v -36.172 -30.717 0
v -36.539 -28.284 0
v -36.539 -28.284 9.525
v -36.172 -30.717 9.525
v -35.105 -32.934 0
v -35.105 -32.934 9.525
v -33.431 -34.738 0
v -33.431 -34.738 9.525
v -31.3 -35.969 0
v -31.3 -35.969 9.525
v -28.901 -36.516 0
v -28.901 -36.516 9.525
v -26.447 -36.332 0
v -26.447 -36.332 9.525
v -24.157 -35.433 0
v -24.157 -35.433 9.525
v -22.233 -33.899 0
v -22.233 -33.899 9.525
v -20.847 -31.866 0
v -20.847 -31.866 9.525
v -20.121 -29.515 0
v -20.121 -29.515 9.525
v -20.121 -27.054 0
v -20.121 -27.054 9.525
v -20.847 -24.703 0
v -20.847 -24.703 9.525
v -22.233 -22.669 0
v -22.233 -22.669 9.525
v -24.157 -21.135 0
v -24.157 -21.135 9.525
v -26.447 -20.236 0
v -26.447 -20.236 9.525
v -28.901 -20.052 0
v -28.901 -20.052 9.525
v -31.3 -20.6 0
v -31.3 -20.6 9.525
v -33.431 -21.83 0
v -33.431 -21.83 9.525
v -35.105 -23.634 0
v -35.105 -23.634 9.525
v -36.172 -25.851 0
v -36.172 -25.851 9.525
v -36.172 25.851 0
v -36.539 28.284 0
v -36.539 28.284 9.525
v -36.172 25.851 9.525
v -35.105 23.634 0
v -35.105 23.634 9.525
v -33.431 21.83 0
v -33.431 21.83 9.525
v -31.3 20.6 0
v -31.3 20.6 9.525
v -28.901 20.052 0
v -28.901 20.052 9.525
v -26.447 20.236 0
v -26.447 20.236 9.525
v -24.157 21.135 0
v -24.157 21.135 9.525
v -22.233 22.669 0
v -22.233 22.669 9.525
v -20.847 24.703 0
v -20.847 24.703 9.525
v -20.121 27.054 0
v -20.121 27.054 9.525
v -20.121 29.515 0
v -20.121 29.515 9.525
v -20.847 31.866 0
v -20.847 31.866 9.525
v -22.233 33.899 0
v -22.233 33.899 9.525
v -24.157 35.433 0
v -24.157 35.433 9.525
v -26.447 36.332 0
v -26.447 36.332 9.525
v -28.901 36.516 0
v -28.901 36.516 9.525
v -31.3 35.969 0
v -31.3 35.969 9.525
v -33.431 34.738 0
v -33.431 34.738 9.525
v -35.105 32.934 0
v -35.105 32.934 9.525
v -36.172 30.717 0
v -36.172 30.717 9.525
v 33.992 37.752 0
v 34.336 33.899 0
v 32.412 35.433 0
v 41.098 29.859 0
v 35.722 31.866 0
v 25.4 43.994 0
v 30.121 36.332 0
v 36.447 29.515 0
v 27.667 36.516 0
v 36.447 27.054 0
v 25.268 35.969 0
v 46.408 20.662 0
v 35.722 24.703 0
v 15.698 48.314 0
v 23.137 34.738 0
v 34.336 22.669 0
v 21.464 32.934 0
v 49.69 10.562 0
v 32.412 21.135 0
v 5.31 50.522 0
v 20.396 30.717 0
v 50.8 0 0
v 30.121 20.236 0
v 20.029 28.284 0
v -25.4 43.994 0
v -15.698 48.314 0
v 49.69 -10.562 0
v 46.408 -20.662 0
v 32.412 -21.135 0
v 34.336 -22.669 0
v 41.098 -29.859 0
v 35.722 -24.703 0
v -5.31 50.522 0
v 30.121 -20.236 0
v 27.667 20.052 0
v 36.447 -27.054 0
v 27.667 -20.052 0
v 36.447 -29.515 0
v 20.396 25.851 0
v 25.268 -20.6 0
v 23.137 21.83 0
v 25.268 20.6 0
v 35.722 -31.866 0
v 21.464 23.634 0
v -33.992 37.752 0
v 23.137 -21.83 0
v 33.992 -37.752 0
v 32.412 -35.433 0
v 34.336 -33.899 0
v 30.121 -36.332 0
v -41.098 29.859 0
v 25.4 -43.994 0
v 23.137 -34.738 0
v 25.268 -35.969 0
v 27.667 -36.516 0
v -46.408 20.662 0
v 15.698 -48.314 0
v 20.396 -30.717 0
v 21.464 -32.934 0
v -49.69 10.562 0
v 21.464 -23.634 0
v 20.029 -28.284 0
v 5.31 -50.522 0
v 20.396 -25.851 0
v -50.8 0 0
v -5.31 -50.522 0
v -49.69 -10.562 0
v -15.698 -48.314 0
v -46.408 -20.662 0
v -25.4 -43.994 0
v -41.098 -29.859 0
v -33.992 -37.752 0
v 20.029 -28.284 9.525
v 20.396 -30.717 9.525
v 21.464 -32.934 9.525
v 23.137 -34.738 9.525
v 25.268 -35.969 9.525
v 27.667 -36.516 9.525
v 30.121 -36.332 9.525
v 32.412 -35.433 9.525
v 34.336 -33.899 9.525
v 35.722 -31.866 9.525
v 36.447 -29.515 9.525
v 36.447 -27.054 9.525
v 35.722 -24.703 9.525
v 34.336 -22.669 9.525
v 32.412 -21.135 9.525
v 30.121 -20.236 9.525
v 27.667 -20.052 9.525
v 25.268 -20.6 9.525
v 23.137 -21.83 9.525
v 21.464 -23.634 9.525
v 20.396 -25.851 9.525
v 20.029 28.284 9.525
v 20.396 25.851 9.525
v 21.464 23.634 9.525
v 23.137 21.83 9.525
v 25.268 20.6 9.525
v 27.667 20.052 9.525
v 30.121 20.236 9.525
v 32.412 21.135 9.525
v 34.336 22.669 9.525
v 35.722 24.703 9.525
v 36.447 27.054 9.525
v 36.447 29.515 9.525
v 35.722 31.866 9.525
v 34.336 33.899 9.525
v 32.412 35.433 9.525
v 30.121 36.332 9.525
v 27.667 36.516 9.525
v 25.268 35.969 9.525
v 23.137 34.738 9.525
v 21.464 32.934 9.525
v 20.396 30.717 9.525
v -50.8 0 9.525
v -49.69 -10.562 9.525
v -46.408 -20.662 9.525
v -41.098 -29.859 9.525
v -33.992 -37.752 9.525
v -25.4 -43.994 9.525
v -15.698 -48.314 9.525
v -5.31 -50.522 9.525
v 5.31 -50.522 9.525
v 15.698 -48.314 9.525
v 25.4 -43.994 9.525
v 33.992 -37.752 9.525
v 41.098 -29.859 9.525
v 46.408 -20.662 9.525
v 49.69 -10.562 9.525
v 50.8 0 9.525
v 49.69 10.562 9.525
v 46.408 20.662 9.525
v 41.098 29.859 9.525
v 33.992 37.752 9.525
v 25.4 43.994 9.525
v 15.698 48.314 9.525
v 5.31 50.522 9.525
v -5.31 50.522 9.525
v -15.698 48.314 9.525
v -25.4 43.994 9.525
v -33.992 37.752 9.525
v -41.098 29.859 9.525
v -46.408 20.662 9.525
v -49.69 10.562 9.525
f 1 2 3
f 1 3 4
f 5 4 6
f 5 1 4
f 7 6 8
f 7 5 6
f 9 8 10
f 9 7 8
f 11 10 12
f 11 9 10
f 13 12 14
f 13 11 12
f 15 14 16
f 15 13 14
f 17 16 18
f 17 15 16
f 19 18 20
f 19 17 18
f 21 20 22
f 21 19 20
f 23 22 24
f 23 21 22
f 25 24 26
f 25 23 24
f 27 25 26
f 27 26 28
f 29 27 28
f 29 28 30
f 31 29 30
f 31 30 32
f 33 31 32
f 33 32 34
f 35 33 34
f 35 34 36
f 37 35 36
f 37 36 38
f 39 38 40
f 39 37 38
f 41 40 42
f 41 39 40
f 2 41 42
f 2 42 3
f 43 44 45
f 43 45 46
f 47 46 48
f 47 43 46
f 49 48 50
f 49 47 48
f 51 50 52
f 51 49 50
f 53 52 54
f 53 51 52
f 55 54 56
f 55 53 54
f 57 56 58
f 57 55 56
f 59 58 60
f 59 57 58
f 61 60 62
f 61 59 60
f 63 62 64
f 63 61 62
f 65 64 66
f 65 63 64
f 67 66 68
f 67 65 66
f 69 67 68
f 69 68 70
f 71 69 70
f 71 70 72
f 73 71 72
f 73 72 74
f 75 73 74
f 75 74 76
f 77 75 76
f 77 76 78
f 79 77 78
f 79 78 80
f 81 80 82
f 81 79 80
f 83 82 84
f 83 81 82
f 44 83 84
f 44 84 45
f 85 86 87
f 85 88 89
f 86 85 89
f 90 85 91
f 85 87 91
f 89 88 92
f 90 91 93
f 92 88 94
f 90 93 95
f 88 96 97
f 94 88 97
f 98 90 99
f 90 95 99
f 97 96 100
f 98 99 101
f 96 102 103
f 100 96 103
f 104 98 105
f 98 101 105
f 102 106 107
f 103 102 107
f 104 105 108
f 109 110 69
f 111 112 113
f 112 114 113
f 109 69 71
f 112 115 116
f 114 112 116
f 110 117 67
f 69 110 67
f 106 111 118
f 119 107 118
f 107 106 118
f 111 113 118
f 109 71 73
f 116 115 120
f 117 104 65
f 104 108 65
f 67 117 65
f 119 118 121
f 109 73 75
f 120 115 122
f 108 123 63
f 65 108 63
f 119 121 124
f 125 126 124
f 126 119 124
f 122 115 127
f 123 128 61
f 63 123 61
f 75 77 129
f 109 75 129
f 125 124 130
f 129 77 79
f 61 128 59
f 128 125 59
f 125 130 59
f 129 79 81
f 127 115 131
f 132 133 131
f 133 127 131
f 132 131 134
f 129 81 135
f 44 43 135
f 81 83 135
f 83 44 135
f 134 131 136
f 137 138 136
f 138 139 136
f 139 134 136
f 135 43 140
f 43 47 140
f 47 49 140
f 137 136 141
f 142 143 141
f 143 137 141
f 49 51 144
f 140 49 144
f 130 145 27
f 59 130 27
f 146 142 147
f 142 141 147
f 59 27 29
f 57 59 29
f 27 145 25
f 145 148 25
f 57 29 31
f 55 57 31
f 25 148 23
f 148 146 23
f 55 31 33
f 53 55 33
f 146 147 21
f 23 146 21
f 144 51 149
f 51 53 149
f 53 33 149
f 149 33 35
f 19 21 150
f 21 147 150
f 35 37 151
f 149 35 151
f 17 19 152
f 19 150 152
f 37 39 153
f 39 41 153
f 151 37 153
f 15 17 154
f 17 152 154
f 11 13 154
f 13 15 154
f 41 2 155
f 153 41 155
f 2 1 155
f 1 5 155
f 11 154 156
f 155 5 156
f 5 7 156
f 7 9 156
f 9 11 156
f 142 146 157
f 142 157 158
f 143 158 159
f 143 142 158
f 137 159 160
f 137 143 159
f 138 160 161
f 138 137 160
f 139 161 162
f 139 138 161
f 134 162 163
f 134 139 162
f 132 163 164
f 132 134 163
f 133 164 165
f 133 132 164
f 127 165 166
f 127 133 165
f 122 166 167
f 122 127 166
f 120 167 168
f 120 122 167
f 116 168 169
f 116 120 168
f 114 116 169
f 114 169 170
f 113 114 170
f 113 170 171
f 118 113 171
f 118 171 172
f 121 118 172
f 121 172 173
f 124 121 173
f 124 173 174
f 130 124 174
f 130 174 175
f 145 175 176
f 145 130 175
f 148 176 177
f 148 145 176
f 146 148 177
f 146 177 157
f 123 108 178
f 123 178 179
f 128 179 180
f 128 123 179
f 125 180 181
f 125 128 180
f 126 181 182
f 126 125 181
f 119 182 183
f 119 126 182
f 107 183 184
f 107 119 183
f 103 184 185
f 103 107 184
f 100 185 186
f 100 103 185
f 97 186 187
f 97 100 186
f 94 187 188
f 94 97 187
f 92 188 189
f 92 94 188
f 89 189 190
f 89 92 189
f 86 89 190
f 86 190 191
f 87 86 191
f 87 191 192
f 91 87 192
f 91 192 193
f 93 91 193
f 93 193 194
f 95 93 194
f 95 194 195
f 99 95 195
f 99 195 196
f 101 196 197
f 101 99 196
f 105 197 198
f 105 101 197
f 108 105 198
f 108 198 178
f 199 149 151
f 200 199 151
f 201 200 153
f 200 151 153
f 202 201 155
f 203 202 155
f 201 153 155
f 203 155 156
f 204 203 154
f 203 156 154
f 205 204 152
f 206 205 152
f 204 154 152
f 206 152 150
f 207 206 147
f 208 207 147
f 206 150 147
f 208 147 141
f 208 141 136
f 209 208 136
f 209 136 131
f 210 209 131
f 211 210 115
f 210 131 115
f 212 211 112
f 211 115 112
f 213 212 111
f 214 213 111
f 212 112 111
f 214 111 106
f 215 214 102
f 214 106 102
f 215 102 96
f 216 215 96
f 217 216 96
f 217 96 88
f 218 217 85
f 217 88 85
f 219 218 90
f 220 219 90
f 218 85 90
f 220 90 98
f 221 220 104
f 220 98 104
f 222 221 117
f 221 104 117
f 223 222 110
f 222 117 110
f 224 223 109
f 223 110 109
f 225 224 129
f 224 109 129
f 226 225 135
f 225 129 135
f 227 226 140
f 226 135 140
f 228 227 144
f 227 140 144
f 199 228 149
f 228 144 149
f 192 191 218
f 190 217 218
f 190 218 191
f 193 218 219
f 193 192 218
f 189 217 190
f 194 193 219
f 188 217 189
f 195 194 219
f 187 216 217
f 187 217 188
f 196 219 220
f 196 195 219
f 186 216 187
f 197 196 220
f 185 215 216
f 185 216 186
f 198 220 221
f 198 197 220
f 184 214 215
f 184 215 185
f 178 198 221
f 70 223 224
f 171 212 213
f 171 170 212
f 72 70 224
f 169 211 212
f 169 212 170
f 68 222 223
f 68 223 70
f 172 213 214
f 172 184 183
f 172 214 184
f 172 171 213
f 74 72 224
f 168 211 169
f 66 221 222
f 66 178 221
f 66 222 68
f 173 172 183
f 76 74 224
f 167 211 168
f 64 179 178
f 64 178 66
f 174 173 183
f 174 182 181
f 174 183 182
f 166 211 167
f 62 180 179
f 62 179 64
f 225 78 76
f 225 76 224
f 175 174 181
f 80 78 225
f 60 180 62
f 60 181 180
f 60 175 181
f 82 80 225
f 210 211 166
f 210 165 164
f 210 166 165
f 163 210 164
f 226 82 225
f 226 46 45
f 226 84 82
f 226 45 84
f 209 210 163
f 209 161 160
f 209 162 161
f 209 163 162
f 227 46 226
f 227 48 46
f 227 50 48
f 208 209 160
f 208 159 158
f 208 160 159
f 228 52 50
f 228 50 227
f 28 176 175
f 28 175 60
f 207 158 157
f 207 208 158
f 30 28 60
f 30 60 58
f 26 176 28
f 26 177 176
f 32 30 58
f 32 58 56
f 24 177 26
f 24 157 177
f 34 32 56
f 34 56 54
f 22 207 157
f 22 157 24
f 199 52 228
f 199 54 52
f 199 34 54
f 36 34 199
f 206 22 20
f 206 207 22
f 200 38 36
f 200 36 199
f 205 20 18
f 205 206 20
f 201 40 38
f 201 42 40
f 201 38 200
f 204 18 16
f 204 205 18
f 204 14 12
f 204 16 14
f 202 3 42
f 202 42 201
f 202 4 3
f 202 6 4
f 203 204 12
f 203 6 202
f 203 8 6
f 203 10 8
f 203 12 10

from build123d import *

# Parameters (mm, degrees)
SKETCH2_R           = 50.8
SKETCH2_R_2         = 8.255
BOSS_EXTRUDE2_DEPTH = 9.525


with BuildPart() as part:
    # Sketch2 → Boss-Extrude2 (new body)
    with BuildSketch(Plane.XY):
        with Locations(Location((0, 0, 0), (0, 0, 180))):
            Circle(SKETCH2_R)
        with Locations(Location((-28.284214679, 28.284214679, 0), (0, 0, 180))):
            Circle(SKETCH2_R_2, mode=Mode.SUBTRACT)
        with Locations(Location((28.284214679, 28.284214679, 0), (0, 0, 180))):
            Circle(SKETCH2_R_2, mode=Mode.SUBTRACT)
        with Locations(Location((28.284214679, -28.284214679, 0), (0, 0, 180))):
            Circle(SKETCH2_R_2, mode=Mode.SUBTRACT)
        with Locations(Location((-28.284214679, -28.284214679, 0), (0, 0, 180))):
            Circle(SKETCH2_R_2, mode=Mode.SUBTRACT)
    extrude(amount=BOSS_EXTRUDE2_DEPTH)


solid = part.part
